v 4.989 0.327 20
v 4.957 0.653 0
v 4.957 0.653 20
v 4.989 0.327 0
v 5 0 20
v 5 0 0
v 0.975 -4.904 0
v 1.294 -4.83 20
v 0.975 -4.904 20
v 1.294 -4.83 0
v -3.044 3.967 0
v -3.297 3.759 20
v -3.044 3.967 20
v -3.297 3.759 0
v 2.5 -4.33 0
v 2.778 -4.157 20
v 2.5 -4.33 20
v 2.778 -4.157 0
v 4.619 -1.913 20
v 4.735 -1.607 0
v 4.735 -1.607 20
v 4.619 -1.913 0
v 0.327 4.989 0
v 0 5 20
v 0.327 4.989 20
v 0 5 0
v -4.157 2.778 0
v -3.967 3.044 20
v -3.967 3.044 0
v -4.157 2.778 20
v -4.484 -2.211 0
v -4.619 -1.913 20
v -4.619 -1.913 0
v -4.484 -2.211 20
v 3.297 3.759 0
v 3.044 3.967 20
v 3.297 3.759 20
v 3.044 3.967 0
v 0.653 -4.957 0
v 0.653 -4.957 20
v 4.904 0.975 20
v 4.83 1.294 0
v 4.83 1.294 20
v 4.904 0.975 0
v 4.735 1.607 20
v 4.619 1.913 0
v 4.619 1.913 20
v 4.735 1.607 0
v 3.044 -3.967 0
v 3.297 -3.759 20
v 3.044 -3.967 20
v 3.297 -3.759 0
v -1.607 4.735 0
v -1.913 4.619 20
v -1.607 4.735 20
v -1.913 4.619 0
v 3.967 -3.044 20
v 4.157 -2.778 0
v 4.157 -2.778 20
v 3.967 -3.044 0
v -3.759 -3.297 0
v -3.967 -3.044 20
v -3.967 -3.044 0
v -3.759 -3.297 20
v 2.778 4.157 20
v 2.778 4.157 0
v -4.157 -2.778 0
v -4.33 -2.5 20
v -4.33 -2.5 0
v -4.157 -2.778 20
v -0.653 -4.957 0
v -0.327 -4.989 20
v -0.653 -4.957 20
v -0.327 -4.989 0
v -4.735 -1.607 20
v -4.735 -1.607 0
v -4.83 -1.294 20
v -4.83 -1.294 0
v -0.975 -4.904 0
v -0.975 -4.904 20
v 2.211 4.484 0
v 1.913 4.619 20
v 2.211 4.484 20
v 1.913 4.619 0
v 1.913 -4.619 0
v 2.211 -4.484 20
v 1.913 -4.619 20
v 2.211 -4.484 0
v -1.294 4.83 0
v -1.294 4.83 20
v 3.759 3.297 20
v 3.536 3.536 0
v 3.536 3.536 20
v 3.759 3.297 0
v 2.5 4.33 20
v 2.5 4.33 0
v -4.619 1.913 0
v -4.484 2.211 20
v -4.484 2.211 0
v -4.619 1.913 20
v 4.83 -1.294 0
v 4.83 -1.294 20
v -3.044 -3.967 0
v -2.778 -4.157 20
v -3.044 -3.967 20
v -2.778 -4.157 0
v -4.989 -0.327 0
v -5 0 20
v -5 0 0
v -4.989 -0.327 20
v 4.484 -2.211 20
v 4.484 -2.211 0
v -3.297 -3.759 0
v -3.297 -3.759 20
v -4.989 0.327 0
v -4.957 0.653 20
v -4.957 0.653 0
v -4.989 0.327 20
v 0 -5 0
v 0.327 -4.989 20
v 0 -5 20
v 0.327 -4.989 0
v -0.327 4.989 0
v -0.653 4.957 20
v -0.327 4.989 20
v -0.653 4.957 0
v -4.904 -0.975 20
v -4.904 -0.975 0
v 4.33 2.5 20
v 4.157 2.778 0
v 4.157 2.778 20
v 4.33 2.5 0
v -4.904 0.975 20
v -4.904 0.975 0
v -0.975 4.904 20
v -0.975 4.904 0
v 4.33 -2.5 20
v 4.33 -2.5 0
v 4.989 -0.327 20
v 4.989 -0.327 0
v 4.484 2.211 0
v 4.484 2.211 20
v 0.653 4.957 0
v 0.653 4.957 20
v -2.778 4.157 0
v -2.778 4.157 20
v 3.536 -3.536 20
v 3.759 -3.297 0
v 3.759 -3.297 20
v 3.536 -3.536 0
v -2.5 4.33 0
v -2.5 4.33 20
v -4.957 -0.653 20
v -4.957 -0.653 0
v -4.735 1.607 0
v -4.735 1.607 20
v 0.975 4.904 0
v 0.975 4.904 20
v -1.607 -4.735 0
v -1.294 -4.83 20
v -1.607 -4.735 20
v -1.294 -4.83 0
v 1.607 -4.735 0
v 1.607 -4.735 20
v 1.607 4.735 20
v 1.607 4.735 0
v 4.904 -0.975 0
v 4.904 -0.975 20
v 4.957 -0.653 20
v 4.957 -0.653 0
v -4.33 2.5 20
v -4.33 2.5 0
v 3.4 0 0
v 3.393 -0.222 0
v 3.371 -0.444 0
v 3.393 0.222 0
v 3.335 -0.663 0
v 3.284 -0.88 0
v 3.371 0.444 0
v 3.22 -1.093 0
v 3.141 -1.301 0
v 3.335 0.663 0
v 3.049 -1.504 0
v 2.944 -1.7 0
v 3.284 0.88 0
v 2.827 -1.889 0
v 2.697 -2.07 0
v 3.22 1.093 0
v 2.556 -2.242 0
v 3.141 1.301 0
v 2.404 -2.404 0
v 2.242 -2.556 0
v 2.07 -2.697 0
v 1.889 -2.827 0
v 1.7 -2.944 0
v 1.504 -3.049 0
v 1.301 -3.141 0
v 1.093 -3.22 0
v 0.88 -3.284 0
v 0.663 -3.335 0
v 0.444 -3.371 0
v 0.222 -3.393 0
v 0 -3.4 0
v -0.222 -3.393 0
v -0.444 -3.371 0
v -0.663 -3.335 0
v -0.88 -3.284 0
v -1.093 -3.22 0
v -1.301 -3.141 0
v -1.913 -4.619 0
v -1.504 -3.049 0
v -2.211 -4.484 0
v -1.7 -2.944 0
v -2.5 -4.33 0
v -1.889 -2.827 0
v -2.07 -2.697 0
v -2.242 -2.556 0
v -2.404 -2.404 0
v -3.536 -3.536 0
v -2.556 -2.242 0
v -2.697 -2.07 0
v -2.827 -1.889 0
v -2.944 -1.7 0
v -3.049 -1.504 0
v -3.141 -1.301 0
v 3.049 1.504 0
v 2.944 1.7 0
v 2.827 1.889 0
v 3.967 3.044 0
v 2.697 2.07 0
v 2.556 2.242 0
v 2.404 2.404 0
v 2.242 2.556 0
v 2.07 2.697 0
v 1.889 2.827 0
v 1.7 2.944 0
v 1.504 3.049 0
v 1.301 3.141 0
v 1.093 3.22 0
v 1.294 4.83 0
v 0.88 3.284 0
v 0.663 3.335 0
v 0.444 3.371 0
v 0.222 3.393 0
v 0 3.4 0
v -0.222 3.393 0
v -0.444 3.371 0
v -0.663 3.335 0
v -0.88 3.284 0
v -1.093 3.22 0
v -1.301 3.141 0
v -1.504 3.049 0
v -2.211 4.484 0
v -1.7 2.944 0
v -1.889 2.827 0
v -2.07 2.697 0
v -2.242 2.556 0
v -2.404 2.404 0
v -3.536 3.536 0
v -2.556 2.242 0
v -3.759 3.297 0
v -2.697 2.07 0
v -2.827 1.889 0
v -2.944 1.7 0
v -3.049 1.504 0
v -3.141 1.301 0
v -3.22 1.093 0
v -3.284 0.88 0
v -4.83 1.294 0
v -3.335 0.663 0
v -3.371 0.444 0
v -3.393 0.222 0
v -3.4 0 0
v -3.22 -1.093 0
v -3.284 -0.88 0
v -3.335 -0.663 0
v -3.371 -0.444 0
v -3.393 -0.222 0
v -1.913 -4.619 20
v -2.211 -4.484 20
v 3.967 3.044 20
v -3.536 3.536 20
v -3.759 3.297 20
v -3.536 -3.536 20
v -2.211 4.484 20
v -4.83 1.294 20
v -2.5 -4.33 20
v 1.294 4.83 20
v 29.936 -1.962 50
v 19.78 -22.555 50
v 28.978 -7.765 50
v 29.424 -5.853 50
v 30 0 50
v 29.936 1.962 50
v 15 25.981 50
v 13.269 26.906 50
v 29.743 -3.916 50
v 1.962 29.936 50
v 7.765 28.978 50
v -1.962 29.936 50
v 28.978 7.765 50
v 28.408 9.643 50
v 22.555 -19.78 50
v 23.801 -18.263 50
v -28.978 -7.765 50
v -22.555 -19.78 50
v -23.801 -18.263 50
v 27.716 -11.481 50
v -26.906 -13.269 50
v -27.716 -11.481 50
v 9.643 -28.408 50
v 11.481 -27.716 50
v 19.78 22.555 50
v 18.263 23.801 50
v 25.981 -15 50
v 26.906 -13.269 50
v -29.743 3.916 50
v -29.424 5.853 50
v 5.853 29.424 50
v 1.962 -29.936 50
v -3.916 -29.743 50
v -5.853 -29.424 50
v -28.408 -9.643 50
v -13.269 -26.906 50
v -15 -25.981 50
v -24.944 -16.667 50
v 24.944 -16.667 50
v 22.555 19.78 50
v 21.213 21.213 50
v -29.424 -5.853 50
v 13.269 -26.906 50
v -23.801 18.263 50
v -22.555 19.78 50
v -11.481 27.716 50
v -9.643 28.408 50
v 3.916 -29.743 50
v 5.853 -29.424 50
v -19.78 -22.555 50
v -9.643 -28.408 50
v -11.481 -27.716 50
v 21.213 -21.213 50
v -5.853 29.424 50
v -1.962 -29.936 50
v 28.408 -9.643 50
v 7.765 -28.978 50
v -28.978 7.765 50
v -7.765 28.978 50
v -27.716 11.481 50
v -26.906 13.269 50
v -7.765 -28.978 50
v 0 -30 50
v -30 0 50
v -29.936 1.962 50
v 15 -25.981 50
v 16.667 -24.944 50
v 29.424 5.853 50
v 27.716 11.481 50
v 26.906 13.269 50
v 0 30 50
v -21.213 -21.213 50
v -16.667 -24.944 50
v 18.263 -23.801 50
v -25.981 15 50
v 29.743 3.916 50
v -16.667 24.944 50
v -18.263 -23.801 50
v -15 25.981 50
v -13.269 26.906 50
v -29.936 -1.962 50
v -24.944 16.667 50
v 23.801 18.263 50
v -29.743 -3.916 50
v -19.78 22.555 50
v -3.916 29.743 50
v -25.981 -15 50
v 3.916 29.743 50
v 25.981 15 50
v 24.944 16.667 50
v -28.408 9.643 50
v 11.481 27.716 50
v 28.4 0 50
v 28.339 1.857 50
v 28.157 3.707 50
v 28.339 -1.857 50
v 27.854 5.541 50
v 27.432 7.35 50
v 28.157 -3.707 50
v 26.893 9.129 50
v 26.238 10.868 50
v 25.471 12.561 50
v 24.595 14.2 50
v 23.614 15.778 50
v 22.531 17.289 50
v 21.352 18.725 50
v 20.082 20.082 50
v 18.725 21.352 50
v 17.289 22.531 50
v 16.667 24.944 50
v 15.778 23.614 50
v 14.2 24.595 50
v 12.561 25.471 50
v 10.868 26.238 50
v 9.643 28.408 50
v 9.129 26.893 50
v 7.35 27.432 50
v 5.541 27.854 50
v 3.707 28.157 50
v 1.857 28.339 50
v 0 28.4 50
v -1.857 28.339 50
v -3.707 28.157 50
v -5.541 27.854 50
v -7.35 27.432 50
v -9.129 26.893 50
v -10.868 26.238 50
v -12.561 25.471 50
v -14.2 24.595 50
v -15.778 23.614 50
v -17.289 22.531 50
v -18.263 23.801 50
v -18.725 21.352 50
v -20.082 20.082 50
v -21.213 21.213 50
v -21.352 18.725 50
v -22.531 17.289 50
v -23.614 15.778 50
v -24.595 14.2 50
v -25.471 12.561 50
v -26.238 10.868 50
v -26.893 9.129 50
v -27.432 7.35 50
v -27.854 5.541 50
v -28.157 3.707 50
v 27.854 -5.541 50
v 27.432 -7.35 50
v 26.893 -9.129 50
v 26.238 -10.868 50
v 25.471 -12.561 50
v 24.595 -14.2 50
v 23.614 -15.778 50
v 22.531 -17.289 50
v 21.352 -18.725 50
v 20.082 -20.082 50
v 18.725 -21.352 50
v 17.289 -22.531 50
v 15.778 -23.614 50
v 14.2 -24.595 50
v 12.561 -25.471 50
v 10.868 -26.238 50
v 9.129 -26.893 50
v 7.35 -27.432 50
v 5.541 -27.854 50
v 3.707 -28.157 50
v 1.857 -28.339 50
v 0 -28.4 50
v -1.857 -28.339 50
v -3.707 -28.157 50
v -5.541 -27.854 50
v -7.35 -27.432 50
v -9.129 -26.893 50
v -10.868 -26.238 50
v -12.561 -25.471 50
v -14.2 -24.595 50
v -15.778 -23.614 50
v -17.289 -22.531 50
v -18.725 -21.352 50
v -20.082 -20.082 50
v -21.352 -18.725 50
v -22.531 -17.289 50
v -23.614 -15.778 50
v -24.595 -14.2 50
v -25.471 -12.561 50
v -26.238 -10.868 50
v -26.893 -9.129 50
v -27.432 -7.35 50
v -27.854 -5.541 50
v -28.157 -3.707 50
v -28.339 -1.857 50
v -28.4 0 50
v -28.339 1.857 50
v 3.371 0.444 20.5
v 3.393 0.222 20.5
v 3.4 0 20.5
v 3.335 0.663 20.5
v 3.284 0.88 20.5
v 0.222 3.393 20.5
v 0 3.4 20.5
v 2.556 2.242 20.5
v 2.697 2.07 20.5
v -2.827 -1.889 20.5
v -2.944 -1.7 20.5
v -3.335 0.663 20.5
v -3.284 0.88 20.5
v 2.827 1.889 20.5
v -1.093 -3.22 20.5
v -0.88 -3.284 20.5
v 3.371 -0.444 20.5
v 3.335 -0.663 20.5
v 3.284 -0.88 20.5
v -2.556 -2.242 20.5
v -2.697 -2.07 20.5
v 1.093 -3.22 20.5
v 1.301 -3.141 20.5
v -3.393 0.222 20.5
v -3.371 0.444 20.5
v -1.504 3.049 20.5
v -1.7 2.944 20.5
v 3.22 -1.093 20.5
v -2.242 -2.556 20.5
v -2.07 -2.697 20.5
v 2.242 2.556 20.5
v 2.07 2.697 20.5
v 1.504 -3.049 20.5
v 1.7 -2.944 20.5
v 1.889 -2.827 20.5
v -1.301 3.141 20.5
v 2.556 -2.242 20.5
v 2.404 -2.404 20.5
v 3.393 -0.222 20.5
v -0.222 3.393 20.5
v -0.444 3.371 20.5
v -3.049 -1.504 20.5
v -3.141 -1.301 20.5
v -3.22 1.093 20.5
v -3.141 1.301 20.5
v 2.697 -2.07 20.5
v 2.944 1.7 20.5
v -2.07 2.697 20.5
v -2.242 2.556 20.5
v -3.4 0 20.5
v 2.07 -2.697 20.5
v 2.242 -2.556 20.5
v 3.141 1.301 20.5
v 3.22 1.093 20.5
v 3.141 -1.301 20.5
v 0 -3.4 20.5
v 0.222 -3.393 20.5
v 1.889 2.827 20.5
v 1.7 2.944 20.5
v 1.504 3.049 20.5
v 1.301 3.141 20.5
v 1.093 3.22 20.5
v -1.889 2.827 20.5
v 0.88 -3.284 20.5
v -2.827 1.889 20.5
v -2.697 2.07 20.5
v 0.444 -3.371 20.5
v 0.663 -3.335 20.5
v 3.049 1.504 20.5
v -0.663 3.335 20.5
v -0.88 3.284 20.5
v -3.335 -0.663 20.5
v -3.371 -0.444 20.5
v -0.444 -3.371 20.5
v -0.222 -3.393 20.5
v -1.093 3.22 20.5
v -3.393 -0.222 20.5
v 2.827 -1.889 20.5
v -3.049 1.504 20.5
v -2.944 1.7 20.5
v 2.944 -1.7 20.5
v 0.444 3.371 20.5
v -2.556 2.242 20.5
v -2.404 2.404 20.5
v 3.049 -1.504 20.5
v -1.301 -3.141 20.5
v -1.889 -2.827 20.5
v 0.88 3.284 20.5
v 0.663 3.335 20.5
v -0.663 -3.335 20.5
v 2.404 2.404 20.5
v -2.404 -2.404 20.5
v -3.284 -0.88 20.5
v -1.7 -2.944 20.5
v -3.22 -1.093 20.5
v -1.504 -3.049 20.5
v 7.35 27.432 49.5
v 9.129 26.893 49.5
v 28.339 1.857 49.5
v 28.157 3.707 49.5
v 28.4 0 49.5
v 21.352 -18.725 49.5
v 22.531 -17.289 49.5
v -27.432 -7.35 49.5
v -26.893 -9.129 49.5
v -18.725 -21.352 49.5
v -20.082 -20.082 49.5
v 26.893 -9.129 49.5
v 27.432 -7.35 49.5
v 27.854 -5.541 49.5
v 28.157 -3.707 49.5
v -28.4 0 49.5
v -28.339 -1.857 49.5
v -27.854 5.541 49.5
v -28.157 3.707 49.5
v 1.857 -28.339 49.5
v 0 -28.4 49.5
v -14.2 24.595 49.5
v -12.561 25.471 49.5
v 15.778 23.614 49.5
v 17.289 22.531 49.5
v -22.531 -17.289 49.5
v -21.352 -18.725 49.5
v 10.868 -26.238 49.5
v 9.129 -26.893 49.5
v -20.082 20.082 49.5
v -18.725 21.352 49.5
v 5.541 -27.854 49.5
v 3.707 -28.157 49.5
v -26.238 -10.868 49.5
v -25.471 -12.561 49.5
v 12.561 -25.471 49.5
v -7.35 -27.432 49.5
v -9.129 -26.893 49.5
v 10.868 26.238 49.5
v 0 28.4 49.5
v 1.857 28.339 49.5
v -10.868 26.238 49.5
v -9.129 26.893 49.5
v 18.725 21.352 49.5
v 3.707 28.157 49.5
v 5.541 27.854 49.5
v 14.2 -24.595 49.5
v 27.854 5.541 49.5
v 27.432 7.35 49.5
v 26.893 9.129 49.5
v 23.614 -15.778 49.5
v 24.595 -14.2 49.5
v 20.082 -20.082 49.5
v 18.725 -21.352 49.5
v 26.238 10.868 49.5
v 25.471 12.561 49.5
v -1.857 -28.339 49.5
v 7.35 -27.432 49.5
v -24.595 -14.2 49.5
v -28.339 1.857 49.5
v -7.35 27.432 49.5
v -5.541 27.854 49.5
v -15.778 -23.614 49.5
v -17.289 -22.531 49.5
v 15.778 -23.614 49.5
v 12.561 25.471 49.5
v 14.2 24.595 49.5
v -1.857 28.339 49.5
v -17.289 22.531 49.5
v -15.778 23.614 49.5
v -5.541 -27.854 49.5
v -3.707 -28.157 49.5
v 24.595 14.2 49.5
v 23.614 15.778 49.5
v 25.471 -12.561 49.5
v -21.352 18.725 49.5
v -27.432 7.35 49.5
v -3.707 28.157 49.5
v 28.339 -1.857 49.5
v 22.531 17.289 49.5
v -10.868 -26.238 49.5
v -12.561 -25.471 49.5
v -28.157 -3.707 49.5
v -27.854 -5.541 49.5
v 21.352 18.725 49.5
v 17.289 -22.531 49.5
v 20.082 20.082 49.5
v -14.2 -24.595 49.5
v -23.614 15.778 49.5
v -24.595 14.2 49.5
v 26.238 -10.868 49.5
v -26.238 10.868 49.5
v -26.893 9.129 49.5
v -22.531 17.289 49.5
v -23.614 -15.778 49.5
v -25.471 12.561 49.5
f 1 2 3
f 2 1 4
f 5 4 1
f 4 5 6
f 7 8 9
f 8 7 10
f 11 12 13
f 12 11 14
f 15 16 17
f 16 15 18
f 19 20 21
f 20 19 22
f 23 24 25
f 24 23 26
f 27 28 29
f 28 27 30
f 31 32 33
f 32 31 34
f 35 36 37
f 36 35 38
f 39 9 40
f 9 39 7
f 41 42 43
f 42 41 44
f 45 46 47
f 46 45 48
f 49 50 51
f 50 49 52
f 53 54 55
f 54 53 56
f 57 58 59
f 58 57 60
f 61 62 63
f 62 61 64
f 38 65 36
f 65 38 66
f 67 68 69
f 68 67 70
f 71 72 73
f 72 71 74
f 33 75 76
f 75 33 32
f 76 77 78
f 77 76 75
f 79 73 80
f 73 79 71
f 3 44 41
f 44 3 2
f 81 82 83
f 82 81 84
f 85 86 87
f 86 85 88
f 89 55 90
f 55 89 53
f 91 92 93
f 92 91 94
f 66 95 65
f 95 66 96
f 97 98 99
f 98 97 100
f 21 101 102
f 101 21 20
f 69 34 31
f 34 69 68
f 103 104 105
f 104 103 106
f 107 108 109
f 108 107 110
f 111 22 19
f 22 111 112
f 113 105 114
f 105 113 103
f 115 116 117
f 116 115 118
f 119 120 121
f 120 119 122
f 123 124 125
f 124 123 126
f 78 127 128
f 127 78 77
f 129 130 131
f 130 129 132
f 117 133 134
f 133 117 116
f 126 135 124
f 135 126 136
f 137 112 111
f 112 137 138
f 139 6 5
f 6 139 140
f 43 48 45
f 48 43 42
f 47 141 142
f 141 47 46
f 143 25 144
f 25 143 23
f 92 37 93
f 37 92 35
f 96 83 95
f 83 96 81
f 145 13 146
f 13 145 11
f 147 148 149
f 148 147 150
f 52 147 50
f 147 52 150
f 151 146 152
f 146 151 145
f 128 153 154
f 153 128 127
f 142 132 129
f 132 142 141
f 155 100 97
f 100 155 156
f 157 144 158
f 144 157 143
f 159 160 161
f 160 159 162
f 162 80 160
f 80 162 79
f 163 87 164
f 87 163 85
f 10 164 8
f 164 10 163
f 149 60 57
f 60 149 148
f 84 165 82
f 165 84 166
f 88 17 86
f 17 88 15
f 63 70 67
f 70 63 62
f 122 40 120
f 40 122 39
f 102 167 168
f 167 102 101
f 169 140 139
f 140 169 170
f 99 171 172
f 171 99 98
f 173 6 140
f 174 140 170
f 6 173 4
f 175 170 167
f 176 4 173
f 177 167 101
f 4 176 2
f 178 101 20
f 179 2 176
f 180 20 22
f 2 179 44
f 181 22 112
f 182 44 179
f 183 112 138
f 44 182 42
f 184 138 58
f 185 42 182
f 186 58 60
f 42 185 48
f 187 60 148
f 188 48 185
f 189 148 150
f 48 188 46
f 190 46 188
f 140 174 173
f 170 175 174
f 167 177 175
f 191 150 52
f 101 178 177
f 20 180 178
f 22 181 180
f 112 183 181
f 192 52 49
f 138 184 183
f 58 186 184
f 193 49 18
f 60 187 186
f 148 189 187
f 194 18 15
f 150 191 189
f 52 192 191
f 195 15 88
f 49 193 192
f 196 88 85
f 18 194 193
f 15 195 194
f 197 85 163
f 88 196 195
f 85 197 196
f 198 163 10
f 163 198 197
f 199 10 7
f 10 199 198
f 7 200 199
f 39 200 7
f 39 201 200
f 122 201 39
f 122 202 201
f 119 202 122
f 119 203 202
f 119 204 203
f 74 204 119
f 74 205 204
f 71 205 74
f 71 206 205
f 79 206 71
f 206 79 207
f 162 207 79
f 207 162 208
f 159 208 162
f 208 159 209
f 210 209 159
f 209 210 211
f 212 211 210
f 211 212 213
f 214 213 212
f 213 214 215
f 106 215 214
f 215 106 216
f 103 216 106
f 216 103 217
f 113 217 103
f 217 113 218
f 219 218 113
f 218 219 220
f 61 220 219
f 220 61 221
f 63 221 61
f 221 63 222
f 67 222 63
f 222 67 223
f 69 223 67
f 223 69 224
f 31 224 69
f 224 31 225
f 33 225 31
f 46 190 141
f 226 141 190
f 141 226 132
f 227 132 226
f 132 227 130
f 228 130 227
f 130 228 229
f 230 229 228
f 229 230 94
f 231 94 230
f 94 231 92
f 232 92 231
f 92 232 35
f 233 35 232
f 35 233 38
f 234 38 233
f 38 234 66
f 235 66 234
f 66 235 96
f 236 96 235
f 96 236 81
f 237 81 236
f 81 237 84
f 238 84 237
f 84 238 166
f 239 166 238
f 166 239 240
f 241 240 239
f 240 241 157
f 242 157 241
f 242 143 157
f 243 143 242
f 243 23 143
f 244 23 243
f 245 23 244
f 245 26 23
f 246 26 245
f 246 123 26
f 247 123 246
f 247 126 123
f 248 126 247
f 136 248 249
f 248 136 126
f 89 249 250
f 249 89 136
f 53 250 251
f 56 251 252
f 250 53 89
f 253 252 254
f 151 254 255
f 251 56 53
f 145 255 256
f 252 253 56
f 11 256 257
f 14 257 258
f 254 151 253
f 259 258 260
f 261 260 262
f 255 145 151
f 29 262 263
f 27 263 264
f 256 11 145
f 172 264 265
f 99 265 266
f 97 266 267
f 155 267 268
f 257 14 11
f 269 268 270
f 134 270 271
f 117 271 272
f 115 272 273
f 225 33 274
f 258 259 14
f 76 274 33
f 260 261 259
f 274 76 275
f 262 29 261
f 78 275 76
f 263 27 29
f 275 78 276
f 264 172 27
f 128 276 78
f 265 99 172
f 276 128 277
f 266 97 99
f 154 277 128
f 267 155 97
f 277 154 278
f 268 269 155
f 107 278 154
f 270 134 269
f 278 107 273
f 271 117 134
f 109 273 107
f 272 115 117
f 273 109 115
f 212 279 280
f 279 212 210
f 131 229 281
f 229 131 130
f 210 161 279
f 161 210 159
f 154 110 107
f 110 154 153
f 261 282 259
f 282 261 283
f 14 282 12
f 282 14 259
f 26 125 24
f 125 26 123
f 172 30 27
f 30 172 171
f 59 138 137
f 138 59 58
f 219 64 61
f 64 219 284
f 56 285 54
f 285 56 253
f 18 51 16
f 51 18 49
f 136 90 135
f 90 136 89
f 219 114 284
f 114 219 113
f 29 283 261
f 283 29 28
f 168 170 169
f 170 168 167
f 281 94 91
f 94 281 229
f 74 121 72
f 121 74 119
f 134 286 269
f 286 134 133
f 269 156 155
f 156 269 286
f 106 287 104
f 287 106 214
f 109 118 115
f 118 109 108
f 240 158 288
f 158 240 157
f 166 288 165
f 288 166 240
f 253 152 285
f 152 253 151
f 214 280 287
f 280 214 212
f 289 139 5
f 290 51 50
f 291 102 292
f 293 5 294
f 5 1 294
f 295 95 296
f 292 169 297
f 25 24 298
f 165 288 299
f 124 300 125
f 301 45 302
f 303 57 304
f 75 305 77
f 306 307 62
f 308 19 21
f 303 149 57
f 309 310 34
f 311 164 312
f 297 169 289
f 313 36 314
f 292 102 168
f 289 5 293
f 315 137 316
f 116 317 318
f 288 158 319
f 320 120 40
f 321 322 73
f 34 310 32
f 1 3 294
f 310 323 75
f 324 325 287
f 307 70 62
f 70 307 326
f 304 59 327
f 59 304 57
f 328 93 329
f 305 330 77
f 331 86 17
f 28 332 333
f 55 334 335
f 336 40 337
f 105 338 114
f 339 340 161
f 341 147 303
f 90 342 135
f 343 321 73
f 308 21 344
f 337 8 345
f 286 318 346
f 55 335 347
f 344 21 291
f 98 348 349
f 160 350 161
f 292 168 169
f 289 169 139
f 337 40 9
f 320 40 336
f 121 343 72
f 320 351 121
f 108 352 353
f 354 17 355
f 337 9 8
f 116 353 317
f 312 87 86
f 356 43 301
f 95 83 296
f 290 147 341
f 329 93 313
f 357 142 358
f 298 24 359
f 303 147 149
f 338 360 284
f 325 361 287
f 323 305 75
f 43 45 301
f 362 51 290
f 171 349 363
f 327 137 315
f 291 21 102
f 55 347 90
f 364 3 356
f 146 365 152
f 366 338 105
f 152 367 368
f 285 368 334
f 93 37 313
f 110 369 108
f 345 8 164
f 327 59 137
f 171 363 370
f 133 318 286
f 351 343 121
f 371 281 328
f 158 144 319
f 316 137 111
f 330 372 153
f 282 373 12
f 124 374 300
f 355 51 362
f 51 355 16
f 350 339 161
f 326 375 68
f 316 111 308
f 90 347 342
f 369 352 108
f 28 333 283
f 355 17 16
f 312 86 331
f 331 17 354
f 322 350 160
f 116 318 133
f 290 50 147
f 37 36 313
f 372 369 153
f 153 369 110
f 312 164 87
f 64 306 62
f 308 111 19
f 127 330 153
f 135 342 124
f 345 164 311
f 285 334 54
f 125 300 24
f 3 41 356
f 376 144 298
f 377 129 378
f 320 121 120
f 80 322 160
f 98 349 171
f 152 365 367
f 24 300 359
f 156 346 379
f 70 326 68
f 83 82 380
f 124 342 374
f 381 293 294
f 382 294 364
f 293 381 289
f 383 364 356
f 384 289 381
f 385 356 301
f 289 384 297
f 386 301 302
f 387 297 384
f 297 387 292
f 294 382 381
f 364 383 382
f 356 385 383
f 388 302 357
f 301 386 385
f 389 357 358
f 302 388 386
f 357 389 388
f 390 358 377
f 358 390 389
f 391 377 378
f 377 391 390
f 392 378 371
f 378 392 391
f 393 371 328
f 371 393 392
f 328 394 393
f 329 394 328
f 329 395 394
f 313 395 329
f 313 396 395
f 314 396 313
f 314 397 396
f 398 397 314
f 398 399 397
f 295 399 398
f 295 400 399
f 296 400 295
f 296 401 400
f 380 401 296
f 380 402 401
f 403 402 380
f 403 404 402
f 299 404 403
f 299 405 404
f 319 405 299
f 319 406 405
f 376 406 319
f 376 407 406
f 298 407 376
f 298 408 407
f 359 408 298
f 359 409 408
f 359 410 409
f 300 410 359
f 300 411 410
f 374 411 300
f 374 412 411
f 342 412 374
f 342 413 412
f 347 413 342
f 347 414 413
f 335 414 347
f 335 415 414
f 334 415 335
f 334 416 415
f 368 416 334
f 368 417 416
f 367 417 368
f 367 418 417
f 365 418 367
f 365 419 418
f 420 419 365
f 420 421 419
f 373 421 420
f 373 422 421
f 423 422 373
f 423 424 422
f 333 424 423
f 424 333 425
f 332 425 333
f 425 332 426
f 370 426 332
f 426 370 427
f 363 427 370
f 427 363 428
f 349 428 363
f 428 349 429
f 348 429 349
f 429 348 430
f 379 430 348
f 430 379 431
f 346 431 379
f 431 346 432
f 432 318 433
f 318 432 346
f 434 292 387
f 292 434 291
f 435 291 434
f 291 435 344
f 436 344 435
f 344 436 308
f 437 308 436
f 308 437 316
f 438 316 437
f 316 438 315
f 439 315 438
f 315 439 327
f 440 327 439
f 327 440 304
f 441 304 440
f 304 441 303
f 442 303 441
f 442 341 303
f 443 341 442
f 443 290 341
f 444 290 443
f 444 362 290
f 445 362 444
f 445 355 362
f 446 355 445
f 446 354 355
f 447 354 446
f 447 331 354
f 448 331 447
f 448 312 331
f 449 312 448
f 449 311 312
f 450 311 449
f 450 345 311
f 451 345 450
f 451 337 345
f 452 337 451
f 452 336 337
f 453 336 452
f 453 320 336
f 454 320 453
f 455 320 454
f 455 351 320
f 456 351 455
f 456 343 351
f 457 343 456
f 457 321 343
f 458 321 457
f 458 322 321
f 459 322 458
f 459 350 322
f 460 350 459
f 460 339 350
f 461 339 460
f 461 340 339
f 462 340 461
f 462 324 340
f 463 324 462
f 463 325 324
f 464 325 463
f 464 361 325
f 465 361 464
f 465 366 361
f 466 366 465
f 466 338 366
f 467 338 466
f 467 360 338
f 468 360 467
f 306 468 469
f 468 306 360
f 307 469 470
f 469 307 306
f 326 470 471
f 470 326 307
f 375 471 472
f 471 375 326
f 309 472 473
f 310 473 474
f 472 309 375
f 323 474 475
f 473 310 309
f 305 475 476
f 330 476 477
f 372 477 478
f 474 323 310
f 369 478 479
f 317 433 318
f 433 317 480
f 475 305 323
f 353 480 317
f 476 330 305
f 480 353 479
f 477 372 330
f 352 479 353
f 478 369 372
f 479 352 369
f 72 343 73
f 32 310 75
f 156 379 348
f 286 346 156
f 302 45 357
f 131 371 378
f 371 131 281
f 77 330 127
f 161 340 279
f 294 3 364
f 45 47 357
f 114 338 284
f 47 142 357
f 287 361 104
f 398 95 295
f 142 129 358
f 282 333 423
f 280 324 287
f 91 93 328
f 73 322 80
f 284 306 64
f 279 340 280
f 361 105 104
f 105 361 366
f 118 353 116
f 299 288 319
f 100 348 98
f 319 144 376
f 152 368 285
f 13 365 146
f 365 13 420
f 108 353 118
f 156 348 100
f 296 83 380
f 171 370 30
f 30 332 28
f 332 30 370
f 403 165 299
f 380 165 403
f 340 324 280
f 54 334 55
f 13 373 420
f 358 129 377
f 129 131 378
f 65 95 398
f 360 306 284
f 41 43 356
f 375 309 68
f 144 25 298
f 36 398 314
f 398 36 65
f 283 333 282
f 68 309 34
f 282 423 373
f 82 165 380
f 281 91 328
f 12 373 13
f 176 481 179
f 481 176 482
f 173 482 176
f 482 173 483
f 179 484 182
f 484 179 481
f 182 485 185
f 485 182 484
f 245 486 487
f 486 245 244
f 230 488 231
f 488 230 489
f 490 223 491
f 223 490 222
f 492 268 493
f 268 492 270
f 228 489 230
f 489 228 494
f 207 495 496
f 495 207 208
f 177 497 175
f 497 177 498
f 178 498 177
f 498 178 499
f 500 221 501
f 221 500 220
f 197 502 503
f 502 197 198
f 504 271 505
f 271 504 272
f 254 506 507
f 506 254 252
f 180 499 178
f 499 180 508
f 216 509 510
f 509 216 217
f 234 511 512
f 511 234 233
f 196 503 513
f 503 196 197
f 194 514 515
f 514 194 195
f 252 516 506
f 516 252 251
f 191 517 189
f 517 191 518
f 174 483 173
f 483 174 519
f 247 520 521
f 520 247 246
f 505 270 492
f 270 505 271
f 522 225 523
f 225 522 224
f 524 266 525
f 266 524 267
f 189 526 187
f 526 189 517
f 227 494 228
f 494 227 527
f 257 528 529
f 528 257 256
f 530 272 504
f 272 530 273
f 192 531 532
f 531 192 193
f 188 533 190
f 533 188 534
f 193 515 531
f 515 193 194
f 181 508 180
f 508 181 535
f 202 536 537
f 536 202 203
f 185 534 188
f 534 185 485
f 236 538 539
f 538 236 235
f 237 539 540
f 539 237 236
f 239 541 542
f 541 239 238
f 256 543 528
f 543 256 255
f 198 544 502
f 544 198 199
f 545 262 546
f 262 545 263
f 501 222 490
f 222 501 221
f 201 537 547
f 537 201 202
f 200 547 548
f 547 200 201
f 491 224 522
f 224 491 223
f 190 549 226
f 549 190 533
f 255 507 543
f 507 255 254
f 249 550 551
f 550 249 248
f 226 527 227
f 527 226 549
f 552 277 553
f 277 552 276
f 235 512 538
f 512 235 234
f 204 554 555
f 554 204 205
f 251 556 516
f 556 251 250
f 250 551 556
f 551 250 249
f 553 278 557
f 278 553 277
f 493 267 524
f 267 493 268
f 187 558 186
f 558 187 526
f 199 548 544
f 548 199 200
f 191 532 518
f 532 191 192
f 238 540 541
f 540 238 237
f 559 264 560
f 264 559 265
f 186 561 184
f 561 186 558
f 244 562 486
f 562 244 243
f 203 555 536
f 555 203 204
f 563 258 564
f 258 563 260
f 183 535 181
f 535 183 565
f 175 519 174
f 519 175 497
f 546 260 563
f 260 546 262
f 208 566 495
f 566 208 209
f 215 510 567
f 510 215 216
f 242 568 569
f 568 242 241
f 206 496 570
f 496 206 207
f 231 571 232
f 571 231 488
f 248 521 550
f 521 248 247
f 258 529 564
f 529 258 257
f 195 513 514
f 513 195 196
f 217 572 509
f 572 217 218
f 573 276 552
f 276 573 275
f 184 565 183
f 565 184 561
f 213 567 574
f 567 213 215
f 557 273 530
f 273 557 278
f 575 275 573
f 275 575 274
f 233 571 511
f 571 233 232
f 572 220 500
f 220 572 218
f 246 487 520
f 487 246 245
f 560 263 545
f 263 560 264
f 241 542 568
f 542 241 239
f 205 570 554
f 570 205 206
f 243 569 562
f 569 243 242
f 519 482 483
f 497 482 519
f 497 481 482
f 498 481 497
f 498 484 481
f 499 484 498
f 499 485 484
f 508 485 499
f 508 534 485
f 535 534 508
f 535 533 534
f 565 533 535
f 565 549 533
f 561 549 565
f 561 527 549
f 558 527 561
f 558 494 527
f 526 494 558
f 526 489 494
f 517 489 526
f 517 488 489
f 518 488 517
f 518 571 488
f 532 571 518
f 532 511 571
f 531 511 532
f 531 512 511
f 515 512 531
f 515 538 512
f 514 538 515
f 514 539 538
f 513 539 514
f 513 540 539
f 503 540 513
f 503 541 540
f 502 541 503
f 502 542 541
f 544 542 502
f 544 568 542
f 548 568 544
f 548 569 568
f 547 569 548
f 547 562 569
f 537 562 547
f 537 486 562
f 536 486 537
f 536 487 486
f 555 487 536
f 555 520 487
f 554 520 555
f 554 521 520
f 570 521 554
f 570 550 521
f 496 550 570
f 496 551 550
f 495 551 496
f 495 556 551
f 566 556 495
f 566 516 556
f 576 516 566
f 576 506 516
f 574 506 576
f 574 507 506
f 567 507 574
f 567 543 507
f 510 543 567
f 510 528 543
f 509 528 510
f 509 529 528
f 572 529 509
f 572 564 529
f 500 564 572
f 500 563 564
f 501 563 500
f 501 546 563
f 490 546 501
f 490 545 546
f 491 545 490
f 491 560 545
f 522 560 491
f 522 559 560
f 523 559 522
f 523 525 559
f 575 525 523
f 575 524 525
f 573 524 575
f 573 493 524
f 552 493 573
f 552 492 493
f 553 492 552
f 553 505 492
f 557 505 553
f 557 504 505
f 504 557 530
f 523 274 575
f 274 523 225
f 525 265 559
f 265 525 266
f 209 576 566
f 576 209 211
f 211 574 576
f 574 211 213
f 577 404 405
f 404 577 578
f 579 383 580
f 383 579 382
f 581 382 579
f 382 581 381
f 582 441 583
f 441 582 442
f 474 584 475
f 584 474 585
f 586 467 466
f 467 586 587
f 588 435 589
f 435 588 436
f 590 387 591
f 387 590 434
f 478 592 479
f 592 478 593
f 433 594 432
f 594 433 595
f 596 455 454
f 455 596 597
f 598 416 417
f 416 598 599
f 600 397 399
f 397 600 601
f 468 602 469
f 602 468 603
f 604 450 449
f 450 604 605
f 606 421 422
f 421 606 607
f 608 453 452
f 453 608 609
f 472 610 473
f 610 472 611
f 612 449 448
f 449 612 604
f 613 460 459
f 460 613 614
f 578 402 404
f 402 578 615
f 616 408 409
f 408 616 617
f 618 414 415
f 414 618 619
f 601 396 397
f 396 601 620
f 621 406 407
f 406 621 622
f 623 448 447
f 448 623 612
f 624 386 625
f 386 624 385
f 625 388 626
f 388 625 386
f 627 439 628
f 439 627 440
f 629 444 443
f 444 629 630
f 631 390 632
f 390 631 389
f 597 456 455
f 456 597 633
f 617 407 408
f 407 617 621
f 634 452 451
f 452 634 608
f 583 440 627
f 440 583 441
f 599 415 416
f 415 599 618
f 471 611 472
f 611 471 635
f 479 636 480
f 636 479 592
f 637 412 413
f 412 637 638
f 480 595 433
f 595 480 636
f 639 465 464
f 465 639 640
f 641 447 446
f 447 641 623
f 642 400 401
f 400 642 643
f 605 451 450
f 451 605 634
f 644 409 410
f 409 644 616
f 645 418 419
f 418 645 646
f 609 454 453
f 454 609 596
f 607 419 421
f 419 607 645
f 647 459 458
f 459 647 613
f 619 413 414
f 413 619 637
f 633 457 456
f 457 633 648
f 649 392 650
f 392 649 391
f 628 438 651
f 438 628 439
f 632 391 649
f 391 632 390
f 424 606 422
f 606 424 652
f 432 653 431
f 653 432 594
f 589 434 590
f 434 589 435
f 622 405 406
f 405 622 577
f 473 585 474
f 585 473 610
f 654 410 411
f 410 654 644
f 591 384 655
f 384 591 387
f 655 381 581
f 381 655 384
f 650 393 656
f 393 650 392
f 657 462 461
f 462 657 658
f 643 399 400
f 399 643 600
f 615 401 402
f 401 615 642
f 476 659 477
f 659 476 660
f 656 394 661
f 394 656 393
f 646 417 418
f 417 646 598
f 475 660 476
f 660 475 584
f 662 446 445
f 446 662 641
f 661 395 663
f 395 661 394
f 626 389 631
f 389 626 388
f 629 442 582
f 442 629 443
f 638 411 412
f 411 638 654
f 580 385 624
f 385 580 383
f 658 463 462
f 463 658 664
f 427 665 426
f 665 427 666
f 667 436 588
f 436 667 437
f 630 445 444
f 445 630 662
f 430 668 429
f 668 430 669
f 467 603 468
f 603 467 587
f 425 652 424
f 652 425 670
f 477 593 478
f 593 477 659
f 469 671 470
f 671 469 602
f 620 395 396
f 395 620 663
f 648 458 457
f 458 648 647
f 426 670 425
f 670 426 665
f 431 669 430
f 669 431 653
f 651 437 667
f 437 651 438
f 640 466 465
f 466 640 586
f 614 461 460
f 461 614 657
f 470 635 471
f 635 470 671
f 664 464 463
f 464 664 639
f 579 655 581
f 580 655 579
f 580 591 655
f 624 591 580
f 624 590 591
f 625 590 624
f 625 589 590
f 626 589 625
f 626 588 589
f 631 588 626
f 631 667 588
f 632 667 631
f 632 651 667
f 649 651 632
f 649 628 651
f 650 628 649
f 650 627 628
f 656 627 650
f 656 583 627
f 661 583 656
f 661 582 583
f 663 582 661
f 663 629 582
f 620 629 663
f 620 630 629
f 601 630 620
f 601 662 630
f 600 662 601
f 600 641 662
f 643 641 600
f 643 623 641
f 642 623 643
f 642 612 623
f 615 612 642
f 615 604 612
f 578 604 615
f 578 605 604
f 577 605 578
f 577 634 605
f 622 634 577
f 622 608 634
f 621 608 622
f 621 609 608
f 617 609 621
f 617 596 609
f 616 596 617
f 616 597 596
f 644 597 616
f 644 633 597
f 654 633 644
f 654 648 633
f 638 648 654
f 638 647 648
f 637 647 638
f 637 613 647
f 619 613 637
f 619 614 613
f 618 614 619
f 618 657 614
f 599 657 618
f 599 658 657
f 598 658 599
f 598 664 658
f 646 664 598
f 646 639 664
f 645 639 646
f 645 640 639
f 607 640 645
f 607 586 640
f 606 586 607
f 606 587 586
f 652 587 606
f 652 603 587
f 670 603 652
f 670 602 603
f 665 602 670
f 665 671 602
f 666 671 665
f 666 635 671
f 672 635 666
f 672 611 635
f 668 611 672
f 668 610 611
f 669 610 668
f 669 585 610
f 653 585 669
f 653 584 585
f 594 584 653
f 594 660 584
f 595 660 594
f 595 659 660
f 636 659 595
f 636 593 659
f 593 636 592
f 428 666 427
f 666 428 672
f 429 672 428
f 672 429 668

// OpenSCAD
// Lab funnel - printed upright, open at top and bottom
// Units: mm

$fn = 96;

// --- Dimensions ---
spout_od      = 10;    // spout outer diameter
spout_id      = spout_od - 2 * 1.6;  // spout bore (6.8 mm)
spout_h       = 20;    // spout height (z = 0 to 20)
cone_od_top   = 60;    // funnel rim outer diameter (z = 50)
wall           = 1.6;   // wall thickness everywhere
eps            = 0.5;   // cutter overshoot past faces

// Derived
cone_od_bot   = spout_od;  // cone starts at spout diameter (z = 20)
cone_h        = 50 - spout_h;  // cone runs z = 20 to 50 (height 30)

difference() {
    union() {
        // Spout (tube)
        cylinder(d = spout_od, h = spout_h);
        // Cone: z = 20 (spout top) to z = 50 (rim)
        translate([0, 0, spout_h])
            cylinder(d1 = cone_od_bot, d2 = cone_od_top, h = cone_h);
    }
    // Bottom cutter (through the spout)
    translate([0, 0, -eps])
        cylinder(d = spout_id, h = spout_h + 2 * eps);
    // Top cutter (through the rim)
    translate([0, 0, spout_h + cone_h - eps])
        cylinder(d = cone_od_top - 2 * wall, h = eps);
}
